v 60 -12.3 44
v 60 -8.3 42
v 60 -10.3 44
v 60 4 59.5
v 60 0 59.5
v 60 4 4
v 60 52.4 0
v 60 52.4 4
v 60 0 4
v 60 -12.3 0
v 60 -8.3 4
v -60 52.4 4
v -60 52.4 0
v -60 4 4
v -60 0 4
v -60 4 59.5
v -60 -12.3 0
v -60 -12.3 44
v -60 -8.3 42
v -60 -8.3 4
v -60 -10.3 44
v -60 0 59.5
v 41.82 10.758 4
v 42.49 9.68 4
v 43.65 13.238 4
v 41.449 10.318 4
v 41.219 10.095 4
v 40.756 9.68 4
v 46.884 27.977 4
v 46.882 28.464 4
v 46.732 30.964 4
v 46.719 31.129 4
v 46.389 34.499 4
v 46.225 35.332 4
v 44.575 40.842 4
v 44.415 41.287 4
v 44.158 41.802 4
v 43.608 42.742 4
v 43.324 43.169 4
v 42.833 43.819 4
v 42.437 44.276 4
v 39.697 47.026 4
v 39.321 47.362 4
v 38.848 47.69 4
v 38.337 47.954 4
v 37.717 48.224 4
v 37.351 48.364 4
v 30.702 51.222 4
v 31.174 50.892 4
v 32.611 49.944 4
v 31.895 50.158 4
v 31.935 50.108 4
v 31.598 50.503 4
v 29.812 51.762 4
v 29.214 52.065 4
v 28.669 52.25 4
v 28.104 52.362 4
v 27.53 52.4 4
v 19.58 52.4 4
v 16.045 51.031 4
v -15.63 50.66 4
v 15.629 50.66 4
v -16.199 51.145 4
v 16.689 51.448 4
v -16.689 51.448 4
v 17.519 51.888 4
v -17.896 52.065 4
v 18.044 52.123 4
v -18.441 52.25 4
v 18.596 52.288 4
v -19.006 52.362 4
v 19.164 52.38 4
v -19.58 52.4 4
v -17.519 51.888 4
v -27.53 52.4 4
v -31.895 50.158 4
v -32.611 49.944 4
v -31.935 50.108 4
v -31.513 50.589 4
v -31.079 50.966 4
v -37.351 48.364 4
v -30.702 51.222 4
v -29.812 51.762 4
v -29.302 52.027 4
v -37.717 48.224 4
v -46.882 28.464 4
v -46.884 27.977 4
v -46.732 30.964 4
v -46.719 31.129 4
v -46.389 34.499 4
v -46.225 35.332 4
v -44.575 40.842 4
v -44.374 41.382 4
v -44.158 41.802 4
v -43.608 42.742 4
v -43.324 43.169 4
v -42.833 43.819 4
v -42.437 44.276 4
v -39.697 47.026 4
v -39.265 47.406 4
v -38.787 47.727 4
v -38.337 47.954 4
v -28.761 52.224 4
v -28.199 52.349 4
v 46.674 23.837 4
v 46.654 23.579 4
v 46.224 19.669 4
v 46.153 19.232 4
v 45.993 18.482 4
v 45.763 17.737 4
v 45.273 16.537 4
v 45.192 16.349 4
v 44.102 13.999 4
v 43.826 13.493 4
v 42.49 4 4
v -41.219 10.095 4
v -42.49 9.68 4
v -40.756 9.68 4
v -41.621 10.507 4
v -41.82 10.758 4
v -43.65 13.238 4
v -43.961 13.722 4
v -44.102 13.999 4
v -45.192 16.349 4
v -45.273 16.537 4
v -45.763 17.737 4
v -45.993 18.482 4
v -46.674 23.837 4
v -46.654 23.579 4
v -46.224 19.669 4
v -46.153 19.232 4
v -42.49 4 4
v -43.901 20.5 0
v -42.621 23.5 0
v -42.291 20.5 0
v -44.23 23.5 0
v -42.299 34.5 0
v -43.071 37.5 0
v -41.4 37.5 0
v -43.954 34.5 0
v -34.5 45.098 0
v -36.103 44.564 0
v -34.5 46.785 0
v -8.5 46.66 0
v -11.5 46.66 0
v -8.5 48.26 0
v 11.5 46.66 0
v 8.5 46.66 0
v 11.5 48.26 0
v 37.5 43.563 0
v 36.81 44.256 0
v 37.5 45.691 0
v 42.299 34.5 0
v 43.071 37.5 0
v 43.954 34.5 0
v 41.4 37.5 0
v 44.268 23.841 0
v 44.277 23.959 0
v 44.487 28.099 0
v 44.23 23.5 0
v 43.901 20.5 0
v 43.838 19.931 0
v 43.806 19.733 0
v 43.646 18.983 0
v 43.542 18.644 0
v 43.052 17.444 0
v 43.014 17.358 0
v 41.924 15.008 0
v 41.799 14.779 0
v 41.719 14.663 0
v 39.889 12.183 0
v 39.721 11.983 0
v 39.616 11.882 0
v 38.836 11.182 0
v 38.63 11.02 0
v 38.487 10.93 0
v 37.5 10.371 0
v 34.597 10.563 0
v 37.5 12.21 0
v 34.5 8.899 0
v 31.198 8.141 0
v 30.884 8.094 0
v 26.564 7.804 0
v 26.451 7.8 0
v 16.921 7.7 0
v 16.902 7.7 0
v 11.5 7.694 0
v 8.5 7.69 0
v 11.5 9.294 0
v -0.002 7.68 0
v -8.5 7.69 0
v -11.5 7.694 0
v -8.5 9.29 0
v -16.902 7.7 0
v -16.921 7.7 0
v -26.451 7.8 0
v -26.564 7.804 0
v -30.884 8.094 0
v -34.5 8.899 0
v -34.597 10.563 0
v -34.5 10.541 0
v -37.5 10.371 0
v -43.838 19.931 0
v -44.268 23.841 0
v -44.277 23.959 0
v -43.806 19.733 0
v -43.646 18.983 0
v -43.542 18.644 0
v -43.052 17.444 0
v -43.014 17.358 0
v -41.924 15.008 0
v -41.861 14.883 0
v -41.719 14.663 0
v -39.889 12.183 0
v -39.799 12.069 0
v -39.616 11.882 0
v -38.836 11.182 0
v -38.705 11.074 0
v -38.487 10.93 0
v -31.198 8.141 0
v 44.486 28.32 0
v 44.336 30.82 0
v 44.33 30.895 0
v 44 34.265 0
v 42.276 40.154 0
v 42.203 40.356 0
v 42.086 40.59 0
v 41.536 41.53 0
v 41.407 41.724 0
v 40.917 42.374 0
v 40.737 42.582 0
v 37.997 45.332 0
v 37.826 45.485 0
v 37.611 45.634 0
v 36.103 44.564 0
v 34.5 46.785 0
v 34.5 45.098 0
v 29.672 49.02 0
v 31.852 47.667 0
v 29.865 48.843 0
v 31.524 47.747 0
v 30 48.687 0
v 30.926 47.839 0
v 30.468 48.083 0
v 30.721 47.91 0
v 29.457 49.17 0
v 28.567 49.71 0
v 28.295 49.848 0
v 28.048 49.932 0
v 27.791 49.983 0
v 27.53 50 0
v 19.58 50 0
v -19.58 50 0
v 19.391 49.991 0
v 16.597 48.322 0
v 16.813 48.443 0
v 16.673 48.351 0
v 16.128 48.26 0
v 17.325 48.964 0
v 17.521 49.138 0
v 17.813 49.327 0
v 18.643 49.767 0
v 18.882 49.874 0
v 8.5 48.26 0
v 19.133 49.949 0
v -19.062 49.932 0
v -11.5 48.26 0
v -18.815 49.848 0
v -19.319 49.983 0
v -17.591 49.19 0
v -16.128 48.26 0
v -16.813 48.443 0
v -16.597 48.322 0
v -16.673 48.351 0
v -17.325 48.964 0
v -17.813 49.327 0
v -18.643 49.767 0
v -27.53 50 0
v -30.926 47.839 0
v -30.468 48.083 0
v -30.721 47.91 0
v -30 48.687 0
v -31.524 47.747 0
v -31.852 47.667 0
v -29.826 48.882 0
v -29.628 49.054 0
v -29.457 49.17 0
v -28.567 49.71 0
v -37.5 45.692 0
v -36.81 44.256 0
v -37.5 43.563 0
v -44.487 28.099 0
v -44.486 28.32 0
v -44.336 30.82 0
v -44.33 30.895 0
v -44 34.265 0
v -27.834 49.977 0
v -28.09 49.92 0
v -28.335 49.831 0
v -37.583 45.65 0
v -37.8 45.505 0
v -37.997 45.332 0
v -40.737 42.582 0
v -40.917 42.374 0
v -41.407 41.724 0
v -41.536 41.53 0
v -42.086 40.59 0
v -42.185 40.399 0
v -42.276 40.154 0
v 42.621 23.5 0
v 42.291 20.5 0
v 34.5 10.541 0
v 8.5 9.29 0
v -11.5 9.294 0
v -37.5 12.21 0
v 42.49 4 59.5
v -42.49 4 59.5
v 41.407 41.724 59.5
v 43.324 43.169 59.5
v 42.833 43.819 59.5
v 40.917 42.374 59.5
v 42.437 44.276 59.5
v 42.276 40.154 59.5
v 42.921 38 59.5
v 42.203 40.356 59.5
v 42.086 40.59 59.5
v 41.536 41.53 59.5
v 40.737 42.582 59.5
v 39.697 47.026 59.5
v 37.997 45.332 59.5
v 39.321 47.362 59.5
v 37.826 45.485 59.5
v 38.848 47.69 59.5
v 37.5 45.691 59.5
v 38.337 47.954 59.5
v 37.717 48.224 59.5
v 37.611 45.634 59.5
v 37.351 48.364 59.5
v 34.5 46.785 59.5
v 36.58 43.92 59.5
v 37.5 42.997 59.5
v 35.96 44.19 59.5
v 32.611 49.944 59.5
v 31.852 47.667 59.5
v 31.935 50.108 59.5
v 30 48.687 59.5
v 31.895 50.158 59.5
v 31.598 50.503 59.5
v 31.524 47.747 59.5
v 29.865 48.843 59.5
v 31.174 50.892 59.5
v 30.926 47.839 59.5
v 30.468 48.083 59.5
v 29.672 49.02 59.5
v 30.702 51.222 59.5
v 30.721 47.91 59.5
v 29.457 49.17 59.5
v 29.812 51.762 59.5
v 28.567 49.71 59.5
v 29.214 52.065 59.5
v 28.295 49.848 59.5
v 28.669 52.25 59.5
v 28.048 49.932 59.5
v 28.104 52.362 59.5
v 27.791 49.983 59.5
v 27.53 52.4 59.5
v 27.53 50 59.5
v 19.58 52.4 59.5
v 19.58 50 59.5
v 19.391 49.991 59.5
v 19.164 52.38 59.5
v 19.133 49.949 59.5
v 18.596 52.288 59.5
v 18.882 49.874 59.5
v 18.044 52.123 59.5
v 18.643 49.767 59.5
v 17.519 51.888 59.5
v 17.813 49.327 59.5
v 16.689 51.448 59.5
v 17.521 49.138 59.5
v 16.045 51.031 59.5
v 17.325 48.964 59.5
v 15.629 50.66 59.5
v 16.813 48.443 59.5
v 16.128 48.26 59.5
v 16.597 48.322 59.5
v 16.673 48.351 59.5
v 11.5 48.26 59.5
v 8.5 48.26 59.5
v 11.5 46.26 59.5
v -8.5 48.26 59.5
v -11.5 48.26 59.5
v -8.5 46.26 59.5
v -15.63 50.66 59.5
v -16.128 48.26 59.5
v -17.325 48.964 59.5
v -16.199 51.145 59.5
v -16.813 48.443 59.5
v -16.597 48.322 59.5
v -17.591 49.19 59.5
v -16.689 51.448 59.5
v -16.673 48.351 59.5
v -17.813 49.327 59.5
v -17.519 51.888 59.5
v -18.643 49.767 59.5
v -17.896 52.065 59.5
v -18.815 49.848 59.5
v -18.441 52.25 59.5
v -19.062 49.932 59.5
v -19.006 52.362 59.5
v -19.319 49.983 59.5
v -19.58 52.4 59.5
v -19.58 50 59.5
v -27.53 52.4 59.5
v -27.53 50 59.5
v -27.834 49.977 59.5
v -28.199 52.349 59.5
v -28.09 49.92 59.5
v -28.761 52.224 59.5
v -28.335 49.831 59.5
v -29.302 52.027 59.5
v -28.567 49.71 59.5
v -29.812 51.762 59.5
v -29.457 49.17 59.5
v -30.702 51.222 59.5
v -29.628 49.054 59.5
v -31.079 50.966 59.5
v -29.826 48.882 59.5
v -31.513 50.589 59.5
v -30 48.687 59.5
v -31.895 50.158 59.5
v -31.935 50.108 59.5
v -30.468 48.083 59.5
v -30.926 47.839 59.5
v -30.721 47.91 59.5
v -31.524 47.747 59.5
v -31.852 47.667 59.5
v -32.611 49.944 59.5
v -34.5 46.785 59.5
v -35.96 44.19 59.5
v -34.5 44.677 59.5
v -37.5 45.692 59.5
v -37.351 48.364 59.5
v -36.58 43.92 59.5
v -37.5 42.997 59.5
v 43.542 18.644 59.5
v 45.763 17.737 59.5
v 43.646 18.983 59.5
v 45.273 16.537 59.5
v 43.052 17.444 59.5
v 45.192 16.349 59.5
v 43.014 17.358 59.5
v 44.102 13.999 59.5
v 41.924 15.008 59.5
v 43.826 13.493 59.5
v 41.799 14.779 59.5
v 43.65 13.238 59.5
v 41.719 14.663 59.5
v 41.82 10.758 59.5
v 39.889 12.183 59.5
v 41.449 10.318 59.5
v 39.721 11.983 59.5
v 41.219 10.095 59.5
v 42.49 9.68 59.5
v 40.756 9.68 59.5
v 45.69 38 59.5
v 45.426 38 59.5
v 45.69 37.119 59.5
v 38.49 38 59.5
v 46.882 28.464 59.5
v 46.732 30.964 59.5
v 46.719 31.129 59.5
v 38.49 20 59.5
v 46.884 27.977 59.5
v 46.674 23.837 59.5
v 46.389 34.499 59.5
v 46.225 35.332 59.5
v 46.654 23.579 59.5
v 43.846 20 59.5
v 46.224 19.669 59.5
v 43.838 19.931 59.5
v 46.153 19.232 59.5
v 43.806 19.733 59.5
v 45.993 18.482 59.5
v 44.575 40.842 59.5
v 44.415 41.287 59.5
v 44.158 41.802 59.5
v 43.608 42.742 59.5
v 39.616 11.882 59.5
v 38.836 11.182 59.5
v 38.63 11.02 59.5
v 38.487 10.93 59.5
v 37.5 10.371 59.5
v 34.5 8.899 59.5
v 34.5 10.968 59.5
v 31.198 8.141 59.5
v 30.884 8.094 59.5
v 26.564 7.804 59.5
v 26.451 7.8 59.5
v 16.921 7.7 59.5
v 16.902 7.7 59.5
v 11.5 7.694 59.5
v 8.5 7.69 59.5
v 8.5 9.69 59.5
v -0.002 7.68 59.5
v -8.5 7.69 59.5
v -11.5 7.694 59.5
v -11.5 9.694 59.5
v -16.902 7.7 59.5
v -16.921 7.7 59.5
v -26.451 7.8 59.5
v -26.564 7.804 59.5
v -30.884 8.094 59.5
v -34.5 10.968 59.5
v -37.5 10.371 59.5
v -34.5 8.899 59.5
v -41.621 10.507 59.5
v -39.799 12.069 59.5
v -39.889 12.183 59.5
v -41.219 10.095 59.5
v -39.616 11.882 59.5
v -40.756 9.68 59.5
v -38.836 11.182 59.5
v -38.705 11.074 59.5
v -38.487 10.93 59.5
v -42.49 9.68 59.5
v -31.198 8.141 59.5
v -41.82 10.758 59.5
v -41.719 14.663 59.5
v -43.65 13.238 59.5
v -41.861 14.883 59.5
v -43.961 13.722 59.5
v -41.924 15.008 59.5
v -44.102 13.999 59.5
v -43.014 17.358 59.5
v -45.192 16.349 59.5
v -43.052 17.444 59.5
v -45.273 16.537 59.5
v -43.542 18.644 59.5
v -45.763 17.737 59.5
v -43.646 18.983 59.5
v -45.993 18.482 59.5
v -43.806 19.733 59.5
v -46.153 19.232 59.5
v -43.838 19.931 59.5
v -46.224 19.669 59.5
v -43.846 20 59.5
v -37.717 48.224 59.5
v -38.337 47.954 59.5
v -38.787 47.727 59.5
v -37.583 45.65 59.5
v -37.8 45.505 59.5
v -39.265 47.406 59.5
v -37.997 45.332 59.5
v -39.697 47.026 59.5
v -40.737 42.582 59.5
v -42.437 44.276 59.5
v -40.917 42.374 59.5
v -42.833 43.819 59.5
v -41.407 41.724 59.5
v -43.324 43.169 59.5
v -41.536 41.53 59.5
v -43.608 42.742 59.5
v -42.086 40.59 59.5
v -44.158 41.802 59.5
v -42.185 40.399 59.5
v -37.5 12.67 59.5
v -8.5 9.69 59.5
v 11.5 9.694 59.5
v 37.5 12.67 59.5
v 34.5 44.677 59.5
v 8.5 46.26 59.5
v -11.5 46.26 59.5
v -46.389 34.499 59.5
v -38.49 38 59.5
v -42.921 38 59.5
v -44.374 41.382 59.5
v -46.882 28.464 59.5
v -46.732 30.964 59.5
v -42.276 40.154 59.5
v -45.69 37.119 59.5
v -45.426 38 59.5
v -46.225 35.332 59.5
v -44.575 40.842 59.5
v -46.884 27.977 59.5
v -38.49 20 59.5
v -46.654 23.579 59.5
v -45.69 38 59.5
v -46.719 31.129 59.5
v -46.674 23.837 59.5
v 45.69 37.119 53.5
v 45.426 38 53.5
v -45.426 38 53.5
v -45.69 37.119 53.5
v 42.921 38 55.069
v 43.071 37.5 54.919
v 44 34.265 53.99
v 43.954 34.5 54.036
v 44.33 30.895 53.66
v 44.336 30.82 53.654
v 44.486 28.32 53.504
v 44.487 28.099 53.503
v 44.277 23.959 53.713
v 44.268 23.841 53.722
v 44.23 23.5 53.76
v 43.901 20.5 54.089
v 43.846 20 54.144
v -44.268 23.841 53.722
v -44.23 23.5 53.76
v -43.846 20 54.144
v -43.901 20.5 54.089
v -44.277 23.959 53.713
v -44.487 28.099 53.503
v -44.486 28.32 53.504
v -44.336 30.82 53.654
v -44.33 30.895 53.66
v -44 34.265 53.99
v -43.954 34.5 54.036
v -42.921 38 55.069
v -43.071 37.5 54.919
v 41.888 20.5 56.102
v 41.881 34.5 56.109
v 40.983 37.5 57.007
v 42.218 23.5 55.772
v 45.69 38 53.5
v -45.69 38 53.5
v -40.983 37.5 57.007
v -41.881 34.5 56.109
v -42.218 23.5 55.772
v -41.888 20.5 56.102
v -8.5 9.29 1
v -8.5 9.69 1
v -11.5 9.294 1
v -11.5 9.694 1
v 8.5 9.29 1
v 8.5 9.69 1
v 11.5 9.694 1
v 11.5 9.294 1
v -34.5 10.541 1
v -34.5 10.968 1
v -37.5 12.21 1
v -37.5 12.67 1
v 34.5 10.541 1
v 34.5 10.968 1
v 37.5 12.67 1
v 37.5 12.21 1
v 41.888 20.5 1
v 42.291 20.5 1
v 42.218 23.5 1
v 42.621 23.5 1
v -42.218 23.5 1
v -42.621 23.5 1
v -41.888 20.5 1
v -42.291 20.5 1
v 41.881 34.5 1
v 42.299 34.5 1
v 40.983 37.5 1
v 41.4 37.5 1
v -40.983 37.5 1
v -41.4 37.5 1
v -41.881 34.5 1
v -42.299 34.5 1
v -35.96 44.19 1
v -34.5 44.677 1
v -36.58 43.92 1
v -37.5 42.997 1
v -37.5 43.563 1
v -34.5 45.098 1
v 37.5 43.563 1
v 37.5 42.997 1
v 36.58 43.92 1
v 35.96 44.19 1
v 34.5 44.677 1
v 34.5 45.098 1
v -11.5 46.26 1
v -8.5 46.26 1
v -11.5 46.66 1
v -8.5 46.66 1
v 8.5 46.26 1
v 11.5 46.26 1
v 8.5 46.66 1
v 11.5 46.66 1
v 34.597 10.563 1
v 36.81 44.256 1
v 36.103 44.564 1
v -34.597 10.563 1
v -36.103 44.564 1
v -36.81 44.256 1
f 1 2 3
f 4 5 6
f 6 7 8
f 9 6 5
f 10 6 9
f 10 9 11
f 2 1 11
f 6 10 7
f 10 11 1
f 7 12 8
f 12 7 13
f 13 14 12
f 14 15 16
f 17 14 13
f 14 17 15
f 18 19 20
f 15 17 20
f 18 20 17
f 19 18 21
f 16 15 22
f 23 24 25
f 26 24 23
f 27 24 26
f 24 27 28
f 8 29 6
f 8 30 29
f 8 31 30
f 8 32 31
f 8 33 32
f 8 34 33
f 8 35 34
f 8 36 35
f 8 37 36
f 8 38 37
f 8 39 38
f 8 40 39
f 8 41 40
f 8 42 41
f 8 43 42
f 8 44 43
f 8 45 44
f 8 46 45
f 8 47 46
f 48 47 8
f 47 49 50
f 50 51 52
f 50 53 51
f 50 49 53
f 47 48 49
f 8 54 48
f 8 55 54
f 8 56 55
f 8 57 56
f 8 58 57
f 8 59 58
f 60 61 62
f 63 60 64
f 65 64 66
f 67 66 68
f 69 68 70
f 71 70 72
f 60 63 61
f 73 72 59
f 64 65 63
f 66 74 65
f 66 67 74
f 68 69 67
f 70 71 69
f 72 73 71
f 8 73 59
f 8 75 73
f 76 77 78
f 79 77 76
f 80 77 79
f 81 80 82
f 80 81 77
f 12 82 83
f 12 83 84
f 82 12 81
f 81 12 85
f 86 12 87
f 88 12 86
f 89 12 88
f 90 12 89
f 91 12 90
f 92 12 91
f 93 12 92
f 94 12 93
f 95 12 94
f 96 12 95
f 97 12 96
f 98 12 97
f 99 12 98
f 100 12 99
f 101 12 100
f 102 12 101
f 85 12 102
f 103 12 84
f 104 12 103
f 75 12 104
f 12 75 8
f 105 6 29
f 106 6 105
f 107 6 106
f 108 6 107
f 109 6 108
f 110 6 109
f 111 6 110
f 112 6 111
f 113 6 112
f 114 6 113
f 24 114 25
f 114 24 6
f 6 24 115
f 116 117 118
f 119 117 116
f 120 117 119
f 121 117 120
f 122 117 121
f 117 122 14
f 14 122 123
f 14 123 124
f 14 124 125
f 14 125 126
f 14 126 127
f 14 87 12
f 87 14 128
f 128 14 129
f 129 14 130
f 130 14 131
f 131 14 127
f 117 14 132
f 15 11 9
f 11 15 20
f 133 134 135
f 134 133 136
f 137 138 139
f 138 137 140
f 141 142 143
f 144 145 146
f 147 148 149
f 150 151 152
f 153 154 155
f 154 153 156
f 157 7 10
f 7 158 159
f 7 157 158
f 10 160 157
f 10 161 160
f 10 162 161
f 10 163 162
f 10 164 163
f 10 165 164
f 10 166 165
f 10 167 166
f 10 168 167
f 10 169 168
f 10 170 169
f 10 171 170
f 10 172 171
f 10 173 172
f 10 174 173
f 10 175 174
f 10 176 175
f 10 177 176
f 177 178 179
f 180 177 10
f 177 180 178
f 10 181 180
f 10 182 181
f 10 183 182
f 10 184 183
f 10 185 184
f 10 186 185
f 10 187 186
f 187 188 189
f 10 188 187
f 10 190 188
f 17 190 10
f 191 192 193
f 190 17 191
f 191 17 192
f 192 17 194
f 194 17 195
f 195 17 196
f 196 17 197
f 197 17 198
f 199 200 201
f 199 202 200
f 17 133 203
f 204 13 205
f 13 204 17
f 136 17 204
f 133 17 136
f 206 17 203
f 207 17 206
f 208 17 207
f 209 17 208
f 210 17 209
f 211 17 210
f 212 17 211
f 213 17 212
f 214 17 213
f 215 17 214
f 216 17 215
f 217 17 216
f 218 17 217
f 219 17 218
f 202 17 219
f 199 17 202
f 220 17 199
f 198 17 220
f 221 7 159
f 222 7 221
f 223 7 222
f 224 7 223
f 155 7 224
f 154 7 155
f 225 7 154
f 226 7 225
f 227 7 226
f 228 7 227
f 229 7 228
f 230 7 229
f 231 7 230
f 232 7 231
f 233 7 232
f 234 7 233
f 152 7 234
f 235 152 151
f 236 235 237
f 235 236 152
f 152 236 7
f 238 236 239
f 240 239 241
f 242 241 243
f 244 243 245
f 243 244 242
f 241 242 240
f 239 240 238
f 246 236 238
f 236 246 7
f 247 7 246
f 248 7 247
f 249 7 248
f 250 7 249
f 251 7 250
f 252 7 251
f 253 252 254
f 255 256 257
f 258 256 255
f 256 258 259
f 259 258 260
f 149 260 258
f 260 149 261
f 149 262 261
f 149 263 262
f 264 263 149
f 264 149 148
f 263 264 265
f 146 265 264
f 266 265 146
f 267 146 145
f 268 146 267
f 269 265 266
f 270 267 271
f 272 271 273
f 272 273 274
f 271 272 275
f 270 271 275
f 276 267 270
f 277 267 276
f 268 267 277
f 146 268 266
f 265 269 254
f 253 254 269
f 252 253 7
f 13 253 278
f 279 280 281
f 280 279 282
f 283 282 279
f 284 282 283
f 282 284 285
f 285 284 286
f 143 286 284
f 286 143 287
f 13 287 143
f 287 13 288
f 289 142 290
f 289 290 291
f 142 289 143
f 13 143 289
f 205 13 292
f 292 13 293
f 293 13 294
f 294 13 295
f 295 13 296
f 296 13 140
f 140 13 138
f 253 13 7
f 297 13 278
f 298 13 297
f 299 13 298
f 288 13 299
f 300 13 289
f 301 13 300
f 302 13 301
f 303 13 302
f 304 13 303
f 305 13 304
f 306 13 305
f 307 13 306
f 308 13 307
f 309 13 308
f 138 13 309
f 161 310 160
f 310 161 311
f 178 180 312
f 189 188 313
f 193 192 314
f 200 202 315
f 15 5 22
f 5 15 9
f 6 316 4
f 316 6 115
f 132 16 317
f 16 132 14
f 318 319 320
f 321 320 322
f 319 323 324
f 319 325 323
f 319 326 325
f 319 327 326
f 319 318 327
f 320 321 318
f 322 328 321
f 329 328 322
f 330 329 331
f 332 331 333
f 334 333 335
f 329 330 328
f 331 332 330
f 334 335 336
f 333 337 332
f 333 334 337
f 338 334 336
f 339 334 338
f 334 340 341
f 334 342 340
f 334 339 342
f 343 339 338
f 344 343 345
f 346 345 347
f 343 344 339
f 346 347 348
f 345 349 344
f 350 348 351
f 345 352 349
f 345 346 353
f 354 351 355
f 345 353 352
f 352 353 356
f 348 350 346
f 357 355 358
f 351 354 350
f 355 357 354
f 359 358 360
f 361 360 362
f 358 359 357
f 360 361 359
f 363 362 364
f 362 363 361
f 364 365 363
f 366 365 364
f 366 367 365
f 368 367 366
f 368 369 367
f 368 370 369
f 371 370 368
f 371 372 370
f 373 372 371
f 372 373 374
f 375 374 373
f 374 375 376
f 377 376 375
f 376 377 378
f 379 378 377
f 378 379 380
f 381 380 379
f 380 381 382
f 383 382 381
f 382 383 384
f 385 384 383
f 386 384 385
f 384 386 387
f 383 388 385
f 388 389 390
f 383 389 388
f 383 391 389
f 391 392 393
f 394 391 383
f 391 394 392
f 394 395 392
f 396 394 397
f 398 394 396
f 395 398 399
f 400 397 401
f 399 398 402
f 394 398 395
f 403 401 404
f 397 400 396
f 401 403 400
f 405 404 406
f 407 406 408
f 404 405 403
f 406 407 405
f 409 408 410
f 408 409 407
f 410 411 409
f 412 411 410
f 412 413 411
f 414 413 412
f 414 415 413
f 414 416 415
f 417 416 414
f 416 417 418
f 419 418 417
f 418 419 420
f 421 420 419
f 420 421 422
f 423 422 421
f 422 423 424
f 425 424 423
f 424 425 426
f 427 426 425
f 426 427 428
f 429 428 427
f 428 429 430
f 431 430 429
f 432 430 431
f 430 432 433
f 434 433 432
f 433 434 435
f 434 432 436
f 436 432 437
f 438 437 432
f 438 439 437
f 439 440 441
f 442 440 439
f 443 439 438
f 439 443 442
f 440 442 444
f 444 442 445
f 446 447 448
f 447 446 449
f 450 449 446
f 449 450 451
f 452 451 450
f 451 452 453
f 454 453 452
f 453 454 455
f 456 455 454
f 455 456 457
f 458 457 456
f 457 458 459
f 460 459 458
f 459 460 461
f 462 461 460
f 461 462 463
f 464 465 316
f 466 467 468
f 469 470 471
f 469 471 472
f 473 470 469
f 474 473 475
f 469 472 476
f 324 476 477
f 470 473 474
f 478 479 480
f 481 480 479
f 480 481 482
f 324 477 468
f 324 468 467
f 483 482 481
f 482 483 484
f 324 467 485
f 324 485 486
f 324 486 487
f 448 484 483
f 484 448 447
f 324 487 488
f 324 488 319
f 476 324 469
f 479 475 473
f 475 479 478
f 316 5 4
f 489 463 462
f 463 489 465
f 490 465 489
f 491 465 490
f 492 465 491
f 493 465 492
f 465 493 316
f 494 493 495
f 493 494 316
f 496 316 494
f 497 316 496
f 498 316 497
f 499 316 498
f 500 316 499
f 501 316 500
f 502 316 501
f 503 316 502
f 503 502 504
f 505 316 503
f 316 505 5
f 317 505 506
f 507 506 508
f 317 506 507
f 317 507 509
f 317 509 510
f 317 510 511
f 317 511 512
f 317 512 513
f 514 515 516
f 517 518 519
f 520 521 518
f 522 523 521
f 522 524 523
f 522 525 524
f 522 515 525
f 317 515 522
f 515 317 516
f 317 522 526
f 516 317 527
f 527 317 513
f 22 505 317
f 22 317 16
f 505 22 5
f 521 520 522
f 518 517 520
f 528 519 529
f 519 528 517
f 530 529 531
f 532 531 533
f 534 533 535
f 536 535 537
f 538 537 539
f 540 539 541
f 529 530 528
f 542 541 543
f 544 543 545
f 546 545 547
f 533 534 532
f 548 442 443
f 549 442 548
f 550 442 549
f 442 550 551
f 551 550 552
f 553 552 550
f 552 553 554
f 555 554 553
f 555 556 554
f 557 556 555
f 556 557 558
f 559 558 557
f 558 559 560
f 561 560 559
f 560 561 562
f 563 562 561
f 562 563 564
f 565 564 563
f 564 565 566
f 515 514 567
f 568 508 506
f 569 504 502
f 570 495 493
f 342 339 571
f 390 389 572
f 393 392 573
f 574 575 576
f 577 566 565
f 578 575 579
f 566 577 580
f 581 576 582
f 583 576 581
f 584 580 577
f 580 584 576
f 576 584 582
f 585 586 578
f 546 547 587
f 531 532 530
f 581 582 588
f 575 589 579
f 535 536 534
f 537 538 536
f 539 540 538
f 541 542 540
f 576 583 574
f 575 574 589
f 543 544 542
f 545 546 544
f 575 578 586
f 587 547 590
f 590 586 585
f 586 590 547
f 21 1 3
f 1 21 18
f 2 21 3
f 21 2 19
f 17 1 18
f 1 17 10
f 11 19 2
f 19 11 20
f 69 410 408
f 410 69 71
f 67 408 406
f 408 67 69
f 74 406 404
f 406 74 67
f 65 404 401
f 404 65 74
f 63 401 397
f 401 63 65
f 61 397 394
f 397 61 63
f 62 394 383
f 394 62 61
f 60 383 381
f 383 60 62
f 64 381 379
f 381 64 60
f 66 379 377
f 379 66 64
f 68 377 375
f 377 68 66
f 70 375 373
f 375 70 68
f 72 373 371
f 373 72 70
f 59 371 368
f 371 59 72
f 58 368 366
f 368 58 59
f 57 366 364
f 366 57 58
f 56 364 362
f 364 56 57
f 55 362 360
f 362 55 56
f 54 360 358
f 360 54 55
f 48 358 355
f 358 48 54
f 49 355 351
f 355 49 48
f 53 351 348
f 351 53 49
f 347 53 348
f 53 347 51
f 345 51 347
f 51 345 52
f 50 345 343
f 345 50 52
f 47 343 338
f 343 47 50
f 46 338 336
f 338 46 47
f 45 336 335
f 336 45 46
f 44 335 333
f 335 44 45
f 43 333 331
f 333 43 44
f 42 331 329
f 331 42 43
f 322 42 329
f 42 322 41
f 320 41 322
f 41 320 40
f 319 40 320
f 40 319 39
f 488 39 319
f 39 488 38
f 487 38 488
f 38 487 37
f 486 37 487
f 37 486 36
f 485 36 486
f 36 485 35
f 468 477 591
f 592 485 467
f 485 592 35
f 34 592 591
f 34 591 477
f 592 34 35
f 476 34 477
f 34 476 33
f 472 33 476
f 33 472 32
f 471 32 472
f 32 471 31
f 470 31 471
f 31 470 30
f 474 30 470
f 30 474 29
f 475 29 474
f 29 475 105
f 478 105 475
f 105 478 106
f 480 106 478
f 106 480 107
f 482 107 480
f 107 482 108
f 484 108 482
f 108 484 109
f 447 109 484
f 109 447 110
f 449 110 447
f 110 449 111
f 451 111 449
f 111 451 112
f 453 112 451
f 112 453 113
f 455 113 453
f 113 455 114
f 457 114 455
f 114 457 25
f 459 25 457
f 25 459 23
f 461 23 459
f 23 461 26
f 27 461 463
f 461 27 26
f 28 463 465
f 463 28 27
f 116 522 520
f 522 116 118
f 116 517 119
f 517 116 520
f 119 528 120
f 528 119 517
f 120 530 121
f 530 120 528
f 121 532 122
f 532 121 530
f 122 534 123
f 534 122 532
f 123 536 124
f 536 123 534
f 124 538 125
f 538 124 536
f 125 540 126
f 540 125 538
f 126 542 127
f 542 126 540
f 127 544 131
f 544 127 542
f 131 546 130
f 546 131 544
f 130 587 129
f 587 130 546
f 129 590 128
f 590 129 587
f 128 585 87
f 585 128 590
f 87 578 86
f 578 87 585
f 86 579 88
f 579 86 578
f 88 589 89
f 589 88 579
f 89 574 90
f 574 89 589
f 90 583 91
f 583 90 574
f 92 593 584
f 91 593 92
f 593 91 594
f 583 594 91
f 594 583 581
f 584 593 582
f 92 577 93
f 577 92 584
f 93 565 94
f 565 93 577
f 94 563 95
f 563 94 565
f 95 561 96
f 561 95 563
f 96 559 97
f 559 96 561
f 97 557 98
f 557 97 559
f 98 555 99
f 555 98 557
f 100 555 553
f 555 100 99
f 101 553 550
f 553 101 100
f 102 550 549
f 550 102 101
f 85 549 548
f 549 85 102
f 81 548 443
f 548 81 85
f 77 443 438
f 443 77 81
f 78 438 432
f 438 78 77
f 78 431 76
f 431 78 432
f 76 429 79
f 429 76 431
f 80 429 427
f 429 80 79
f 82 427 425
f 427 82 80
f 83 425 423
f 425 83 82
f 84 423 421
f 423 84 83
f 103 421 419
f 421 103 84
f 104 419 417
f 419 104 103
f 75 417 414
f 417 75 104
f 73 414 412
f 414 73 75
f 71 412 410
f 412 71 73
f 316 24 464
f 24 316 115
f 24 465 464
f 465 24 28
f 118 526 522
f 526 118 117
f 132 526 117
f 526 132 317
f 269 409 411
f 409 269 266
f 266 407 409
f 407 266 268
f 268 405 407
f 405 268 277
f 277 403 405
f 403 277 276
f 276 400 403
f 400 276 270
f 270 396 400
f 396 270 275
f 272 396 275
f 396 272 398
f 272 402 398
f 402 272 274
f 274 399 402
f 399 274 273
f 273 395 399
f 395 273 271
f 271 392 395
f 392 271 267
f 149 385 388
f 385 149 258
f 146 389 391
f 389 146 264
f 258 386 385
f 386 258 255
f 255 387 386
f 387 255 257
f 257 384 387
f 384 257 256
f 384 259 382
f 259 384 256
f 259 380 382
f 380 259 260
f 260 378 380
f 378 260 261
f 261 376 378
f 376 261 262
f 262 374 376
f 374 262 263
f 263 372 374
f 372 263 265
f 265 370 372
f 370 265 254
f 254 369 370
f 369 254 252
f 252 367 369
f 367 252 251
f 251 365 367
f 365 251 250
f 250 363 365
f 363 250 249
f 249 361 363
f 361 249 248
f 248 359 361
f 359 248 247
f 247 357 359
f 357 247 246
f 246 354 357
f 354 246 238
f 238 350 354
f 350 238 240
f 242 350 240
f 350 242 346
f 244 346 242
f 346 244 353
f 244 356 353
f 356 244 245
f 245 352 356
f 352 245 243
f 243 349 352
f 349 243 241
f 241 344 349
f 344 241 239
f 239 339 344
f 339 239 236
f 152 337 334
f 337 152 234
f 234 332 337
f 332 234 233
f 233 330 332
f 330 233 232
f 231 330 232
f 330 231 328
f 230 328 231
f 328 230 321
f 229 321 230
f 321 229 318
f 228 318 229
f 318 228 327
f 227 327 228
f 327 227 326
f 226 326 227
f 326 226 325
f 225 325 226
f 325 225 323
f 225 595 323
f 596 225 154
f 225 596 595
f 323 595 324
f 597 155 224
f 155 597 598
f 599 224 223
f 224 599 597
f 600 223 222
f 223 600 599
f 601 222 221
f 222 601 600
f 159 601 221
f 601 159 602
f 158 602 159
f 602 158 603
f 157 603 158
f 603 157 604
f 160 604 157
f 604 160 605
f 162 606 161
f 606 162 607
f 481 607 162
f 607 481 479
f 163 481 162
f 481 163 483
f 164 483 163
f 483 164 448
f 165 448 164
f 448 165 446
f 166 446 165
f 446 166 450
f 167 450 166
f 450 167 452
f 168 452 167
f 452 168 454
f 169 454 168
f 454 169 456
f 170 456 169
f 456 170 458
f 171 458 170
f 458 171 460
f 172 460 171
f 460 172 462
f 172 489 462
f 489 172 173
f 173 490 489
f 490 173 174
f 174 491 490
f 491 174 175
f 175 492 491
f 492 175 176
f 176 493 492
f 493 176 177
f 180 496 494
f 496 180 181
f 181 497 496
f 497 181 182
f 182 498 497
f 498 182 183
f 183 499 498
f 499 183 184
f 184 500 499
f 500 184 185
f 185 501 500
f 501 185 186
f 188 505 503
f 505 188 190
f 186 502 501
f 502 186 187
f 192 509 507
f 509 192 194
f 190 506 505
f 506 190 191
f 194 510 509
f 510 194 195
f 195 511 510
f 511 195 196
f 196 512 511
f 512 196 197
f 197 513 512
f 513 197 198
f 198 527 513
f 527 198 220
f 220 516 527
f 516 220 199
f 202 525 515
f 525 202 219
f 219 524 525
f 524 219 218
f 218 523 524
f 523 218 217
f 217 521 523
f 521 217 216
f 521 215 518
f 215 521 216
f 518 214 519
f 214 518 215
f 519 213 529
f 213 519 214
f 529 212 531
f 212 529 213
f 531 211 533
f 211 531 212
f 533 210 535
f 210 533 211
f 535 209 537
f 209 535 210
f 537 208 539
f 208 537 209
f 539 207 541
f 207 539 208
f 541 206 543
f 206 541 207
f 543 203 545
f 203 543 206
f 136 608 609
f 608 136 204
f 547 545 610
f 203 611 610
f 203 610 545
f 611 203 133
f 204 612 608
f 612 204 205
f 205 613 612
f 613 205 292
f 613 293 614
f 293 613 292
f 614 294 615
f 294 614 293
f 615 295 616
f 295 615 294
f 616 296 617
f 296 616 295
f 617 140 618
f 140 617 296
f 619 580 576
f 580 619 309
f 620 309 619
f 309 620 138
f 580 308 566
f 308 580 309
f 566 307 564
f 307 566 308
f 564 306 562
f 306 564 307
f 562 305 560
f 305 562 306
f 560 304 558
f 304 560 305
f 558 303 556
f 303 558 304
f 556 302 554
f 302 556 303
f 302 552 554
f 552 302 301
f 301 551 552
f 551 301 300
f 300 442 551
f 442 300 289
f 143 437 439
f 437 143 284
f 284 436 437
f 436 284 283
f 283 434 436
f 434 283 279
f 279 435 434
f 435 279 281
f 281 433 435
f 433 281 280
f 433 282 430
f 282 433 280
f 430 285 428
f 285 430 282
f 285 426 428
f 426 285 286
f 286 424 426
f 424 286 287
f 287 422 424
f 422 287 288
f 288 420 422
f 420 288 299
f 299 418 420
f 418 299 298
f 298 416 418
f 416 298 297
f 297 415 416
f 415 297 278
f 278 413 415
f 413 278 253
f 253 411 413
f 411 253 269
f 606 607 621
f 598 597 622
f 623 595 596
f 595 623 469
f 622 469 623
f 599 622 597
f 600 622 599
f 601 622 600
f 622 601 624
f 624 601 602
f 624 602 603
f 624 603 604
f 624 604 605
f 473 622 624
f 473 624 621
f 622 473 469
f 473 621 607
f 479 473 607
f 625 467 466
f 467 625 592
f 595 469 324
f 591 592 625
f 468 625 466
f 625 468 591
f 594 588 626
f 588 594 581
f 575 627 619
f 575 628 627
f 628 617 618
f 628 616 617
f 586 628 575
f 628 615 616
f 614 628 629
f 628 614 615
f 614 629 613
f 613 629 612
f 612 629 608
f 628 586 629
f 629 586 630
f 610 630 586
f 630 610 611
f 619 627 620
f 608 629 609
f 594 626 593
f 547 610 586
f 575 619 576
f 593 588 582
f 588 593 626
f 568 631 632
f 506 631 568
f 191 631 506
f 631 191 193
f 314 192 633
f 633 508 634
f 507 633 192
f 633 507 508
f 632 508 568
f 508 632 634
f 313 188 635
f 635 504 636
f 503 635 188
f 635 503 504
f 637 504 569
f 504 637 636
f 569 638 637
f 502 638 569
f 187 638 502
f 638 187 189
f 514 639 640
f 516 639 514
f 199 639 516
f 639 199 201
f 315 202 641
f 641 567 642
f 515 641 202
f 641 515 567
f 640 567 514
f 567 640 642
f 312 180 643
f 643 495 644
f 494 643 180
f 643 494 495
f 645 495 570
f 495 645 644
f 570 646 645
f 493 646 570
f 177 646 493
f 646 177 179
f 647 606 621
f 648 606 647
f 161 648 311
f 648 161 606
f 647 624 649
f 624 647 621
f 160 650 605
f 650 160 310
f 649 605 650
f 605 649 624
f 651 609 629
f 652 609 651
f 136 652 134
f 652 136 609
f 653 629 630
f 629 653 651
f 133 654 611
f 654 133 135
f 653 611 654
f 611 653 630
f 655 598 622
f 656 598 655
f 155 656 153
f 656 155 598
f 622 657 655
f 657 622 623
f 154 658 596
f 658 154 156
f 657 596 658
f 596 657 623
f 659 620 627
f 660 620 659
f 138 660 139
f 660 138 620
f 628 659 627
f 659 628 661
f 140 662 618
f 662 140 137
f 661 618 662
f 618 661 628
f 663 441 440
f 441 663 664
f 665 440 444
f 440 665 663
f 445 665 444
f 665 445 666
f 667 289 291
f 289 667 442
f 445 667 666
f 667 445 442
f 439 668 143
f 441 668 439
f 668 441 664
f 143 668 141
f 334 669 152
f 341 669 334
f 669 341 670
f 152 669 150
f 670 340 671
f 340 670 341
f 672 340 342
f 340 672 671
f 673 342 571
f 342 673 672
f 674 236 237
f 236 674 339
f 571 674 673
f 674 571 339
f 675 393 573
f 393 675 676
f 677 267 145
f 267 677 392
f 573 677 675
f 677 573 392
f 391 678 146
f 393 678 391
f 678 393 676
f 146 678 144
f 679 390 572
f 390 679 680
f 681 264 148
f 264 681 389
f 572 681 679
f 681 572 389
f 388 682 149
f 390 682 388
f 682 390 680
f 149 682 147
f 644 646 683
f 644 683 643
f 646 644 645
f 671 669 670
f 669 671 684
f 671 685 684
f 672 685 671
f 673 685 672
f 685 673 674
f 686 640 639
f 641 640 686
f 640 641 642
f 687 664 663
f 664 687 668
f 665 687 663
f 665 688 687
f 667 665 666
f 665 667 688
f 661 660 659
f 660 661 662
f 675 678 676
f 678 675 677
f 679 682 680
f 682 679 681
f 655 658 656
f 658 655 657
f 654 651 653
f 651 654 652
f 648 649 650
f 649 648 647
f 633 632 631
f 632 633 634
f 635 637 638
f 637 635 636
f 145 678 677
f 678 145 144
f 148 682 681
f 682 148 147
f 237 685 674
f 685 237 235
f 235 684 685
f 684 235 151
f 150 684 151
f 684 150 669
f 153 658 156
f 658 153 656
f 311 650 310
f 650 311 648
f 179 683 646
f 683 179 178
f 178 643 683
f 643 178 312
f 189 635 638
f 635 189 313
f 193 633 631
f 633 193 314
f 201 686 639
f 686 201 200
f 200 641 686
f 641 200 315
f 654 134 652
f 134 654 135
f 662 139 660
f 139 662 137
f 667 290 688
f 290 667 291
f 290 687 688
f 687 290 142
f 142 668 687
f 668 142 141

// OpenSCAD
// Shelf hanger for one GL.iNet Comet Pro (GL-RM10) with no holes in it.
//
// Same job and same clip as scripts/rm10_shelf_hanger.scad, but the sleeve
// is drawn here instead of imported from the rack mount: closed walls, no
// vent slots, no lip at the end. Printed on its front face every surface
// is vertical or grows at 45 degrees; nothing is bridged and nothing needs
// support.
//
// Air instead of slots: the sleeve is `gap` larger than the device all
// round and the device rests on ribs that run front to back. The channels
// between the ribs are open at the front and at the back.
//
// Only the inner outline of the rack mount sleeve is reused, as a list of
// points measured from that mesh; the mesh itself is not needed to build.
//
// Model frame: X along the shelf edge, Y from the front face (0) to the
// back, Z up with the shelf underside at Z = 0.
//
// Build:  make rm10-hanger-plain         (STL and previews)
//         make rm10-hanger-plain-save    (copy the STL to models/)
// See specs/rm10-shelf-hanger.md for the reasons behind the numbers.

/* [Shelf] */
shelf_t  = 8;       // shelf thickness
clip_clr = 0.3;     // slack of the slot over the shelf thickness
grip_d   = 40;      // how far the upper jaw reaches over the shelf
jaw_t    = 4;       // upper jaw thickness
web_t    = 4;       // front panel, and the web in front of the shelf edge
plate_t  = 4;       // plate under the shelf
tip_c    = 2;       // lead-in chamfer at the tip of the upper jaw
clip_w   = 120;     // width of panel, plate and jaw

/* [Fit to the device] */
rm_h     = 47;      // device height at the head, feet included
head_clr = 1;       // slack between the head and the shelf underside
seat_d   = 55;      // panel front face to the back face of the device, as in the rack mount
clr_back = 0.5;     // slack between the device back and the stops

/* [Sleeve] */
wall_t   = 2.4;     // sleeve wall
gap      = 2;       // air channel between the device outline and the wall
rib_w    = 3;       // ribs that carry the device
rib_x    = [-36, -10, 10, 36]; // ribs above and below the device; the foot rails run 18 to 30 mm from the middle
rib_z    = [12, 26];           // ribs at each side, height above the sleeve floor
stop     = 4;       // how far each stop reaches in over the back face of the device
stop_z   = [10, 28];           // height range of the stops; the side outline is close to vertical there
flare    = 0.4;     // the opening is this much larger over the first millimetre (elephant foot)

/* [Preview only] */
rm_w = 84; rm_d = 93; rm_body_h = 37.5; rm_out = 37;

/* [Output] */
// "hanger" (print this), or a preview: "assembly", "side"
part = "hanger";

$fn = 48;
eps = 0.01;

// Right half of the inner outline of the rack mount sleeve, X from the
// middle, Z above the sleeve floor (under the feet). It is the device
// outline plus the slack the rack mount gives it.
half = [[0, 38.32], [16.9, 38.3], [26.43, 38.2], [30.75, 37.91], [34.45, 37.06],
        [37.5, 35.33], [38.28, 34.63], [40.11, 32.15], [41.2, 29.8], [41.69, 28.6],
        [41.85, 27.85], [42.28, 23.94], [42.49, 19.8], [42.34, 17.3], [42.01, 13.93],
        [40.36, 8.42], [39.81, 7.48], [39.32, 6.83], [36.58, 4.08], [35.96, 3.81],
        [31.22, 2.23], [30.44, 2.11], [29.81, 1.89], [29.08, 1.39], [28.42, 0.54],
        [27.53, 0], [19.58, 0], [18.75, 0.44], [18.09, 1.11], [17.59, 1.44],
        [17.09, 1.63], [16.26, 1.74], [0, 1.74]];
in_w = 42.49;       // half width of that outline
in_h = 38.32;       // its height

z_floor = -(rm_h + head_clr);            // sleeve floor, under the device feet
z_slot  = shelf_t + clip_clr;            // underside of the upper jaw
out_top = in_h + gap + wall_t;           // sleeve outside, above the sleeve floor
out_bot = -(gap + wall_t);
y_stop  = seat_d + clr_back - gap;       // where the stops start to grow from the wall
len     = y_stop + gap + stop;           // sleeve length

assert(z_floor + out_top <= -plate_t + eps, "sleeve reaches into the plate; raise head_clr or lower gap");
assert(clip_w / 2 >= in_w + gap + wall_t, "clip narrower than the sleeve");
assert(grip_d >= 3 * shelf_t, "upper jaw too short to hold");
assert(stop < 9, "stops cover the ports: only the outer 9 mm of the back face are free");

// For scripts that `use` this file (scripts/rm10_kumiko_panel.scad):
// [sleeve floor Z, face bottom Z, face top Z, face width, gap, half width and height of the outline]
function hanger_face() = [z_floor, z_floor + out_bot, z_slot + jaw_t, clip_w, gap, in_w, in_h];
function hanger_ribs() = [rib_w, rib_x, rib_z];

module box(x0, x1, y0, y1, z0, z1) {
    translate([x0, y0, z0]) cube([x1 - x0, y1 - y0, z1 - z0]);
}

// 2D, in (X, height above the sleeve floor)
module inner() { polygon(half); mirror([1, 0]) polygon(half); }
module cavity() { offset(r = gap) inner(); }
module shell() { offset(r = gap + wall_t) inner(); }
module ribs2d() {
    intersection() {
        difference() { offset(r = gap + 0.2) inner(); inner(); }
        union() {
            for (x = rib_x) translate([x - rib_w / 2, -50]) square([rib_w, 150]);
            for (z = rib_z) translate([-100, z - rib_w / 2]) square([200, rib_w]);
        }
    }
}

// extrude a 2D outline along Y from y0 to y1, with the sleeve floor at z_floor
module along(y0, y1) {
    translate([0, y1, z_floor]) rotate([90, 0, 0]) linear_extrude(y1 - y0) children();
}

// Stop: wedge on the side wall, growing towards the back at 45 degrees.
module stops() {
    s = gap + stop;
    for (m = [0, 1]) mirror([m, 0, 0])
        translate([in_w + gap, y_stop, z_floor + stop_z[0]])
            linear_extrude(stop_z[1] - stop_z[0])
                polygon([[0, 0], [wall_t / 2, 0], [wall_t / 2, s], [-s, s]]);
}

module hanger() {
    difference() {
        union() {
            // front panel and web, one flat face on the bed
            box(-clip_w / 2, clip_w / 2, 0, web_t, z_floor + out_bot, z_slot + jaw_t / 2);
            // plate under the shelf
            box(-clip_w / 2, clip_w / 2, 0, len, -plate_t, 0);
            // upper jaw with a lead-in at its tip
            hull() {
                box(-clip_w / 2, clip_w / 2, 0, web_t + grip_d - tip_c, z_slot, z_slot + jaw_t);
                box(-clip_w / 2, clip_w / 2, web_t + grip_d - eps, web_t + grip_d, z_slot + tip_c, z_slot + jaw_t);
            }
            // sleeve, and the block that joins it to the plate
            along(0, len) shell();
            box(-in_w, in_w, 0, len, z_floor + in_h, -plate_t + eps);
        }
        along(-1, len + 1) cavity();
    }
    along(0, len) ribs2d();
    stops();
}

module opening_relief() {
    along(-1, 1) offset(delta = flare) inner();
}

module part_hanger() {
    difference() { hanger(); opening_relief(); }
}

// Stand-in for the device: rear body in the sleeve, head in front of the panel.
module rm10() {
    color([0.25, 0.27, 0.3]) translate([rm_w / 2, 0, 0]) rotate([90, 0, -90])
        linear_extrude(rm_w) offset(r = 3) offset(delta = -3)
            polygon([[-seat_d, 2.5], [-seat_d, rm_body_h], [0, rm_body_h],
                     [17, rm_h], [19.5, rm_h], [rm_d - seat_d, 9], [rm_d - seat_d - 8, 2.5]]);
}

module assembly() {
    color("Orange") part_hanger();
    translate([0, 0, z_floor]) rm10();
    color("BurlyWood", 0.5) box(-clip_w / 2 - 40, clip_w / 2 + 40, web_t, web_t + 150, 0, shelf_t);
}

if (part == "hanger") {
    rotate([90, 0, 0]) part_hanger();    // on the front face: Y becomes the print Z
} else if (part == "assembly") {
    assembly();
} else if (part == "side") {
    intersection() {
        assembly();
        box(-0.5, clip_w / 2 + 50, -100, 300, -100, 100);
    }
} else {
    assert(false, "unknown part");
}
